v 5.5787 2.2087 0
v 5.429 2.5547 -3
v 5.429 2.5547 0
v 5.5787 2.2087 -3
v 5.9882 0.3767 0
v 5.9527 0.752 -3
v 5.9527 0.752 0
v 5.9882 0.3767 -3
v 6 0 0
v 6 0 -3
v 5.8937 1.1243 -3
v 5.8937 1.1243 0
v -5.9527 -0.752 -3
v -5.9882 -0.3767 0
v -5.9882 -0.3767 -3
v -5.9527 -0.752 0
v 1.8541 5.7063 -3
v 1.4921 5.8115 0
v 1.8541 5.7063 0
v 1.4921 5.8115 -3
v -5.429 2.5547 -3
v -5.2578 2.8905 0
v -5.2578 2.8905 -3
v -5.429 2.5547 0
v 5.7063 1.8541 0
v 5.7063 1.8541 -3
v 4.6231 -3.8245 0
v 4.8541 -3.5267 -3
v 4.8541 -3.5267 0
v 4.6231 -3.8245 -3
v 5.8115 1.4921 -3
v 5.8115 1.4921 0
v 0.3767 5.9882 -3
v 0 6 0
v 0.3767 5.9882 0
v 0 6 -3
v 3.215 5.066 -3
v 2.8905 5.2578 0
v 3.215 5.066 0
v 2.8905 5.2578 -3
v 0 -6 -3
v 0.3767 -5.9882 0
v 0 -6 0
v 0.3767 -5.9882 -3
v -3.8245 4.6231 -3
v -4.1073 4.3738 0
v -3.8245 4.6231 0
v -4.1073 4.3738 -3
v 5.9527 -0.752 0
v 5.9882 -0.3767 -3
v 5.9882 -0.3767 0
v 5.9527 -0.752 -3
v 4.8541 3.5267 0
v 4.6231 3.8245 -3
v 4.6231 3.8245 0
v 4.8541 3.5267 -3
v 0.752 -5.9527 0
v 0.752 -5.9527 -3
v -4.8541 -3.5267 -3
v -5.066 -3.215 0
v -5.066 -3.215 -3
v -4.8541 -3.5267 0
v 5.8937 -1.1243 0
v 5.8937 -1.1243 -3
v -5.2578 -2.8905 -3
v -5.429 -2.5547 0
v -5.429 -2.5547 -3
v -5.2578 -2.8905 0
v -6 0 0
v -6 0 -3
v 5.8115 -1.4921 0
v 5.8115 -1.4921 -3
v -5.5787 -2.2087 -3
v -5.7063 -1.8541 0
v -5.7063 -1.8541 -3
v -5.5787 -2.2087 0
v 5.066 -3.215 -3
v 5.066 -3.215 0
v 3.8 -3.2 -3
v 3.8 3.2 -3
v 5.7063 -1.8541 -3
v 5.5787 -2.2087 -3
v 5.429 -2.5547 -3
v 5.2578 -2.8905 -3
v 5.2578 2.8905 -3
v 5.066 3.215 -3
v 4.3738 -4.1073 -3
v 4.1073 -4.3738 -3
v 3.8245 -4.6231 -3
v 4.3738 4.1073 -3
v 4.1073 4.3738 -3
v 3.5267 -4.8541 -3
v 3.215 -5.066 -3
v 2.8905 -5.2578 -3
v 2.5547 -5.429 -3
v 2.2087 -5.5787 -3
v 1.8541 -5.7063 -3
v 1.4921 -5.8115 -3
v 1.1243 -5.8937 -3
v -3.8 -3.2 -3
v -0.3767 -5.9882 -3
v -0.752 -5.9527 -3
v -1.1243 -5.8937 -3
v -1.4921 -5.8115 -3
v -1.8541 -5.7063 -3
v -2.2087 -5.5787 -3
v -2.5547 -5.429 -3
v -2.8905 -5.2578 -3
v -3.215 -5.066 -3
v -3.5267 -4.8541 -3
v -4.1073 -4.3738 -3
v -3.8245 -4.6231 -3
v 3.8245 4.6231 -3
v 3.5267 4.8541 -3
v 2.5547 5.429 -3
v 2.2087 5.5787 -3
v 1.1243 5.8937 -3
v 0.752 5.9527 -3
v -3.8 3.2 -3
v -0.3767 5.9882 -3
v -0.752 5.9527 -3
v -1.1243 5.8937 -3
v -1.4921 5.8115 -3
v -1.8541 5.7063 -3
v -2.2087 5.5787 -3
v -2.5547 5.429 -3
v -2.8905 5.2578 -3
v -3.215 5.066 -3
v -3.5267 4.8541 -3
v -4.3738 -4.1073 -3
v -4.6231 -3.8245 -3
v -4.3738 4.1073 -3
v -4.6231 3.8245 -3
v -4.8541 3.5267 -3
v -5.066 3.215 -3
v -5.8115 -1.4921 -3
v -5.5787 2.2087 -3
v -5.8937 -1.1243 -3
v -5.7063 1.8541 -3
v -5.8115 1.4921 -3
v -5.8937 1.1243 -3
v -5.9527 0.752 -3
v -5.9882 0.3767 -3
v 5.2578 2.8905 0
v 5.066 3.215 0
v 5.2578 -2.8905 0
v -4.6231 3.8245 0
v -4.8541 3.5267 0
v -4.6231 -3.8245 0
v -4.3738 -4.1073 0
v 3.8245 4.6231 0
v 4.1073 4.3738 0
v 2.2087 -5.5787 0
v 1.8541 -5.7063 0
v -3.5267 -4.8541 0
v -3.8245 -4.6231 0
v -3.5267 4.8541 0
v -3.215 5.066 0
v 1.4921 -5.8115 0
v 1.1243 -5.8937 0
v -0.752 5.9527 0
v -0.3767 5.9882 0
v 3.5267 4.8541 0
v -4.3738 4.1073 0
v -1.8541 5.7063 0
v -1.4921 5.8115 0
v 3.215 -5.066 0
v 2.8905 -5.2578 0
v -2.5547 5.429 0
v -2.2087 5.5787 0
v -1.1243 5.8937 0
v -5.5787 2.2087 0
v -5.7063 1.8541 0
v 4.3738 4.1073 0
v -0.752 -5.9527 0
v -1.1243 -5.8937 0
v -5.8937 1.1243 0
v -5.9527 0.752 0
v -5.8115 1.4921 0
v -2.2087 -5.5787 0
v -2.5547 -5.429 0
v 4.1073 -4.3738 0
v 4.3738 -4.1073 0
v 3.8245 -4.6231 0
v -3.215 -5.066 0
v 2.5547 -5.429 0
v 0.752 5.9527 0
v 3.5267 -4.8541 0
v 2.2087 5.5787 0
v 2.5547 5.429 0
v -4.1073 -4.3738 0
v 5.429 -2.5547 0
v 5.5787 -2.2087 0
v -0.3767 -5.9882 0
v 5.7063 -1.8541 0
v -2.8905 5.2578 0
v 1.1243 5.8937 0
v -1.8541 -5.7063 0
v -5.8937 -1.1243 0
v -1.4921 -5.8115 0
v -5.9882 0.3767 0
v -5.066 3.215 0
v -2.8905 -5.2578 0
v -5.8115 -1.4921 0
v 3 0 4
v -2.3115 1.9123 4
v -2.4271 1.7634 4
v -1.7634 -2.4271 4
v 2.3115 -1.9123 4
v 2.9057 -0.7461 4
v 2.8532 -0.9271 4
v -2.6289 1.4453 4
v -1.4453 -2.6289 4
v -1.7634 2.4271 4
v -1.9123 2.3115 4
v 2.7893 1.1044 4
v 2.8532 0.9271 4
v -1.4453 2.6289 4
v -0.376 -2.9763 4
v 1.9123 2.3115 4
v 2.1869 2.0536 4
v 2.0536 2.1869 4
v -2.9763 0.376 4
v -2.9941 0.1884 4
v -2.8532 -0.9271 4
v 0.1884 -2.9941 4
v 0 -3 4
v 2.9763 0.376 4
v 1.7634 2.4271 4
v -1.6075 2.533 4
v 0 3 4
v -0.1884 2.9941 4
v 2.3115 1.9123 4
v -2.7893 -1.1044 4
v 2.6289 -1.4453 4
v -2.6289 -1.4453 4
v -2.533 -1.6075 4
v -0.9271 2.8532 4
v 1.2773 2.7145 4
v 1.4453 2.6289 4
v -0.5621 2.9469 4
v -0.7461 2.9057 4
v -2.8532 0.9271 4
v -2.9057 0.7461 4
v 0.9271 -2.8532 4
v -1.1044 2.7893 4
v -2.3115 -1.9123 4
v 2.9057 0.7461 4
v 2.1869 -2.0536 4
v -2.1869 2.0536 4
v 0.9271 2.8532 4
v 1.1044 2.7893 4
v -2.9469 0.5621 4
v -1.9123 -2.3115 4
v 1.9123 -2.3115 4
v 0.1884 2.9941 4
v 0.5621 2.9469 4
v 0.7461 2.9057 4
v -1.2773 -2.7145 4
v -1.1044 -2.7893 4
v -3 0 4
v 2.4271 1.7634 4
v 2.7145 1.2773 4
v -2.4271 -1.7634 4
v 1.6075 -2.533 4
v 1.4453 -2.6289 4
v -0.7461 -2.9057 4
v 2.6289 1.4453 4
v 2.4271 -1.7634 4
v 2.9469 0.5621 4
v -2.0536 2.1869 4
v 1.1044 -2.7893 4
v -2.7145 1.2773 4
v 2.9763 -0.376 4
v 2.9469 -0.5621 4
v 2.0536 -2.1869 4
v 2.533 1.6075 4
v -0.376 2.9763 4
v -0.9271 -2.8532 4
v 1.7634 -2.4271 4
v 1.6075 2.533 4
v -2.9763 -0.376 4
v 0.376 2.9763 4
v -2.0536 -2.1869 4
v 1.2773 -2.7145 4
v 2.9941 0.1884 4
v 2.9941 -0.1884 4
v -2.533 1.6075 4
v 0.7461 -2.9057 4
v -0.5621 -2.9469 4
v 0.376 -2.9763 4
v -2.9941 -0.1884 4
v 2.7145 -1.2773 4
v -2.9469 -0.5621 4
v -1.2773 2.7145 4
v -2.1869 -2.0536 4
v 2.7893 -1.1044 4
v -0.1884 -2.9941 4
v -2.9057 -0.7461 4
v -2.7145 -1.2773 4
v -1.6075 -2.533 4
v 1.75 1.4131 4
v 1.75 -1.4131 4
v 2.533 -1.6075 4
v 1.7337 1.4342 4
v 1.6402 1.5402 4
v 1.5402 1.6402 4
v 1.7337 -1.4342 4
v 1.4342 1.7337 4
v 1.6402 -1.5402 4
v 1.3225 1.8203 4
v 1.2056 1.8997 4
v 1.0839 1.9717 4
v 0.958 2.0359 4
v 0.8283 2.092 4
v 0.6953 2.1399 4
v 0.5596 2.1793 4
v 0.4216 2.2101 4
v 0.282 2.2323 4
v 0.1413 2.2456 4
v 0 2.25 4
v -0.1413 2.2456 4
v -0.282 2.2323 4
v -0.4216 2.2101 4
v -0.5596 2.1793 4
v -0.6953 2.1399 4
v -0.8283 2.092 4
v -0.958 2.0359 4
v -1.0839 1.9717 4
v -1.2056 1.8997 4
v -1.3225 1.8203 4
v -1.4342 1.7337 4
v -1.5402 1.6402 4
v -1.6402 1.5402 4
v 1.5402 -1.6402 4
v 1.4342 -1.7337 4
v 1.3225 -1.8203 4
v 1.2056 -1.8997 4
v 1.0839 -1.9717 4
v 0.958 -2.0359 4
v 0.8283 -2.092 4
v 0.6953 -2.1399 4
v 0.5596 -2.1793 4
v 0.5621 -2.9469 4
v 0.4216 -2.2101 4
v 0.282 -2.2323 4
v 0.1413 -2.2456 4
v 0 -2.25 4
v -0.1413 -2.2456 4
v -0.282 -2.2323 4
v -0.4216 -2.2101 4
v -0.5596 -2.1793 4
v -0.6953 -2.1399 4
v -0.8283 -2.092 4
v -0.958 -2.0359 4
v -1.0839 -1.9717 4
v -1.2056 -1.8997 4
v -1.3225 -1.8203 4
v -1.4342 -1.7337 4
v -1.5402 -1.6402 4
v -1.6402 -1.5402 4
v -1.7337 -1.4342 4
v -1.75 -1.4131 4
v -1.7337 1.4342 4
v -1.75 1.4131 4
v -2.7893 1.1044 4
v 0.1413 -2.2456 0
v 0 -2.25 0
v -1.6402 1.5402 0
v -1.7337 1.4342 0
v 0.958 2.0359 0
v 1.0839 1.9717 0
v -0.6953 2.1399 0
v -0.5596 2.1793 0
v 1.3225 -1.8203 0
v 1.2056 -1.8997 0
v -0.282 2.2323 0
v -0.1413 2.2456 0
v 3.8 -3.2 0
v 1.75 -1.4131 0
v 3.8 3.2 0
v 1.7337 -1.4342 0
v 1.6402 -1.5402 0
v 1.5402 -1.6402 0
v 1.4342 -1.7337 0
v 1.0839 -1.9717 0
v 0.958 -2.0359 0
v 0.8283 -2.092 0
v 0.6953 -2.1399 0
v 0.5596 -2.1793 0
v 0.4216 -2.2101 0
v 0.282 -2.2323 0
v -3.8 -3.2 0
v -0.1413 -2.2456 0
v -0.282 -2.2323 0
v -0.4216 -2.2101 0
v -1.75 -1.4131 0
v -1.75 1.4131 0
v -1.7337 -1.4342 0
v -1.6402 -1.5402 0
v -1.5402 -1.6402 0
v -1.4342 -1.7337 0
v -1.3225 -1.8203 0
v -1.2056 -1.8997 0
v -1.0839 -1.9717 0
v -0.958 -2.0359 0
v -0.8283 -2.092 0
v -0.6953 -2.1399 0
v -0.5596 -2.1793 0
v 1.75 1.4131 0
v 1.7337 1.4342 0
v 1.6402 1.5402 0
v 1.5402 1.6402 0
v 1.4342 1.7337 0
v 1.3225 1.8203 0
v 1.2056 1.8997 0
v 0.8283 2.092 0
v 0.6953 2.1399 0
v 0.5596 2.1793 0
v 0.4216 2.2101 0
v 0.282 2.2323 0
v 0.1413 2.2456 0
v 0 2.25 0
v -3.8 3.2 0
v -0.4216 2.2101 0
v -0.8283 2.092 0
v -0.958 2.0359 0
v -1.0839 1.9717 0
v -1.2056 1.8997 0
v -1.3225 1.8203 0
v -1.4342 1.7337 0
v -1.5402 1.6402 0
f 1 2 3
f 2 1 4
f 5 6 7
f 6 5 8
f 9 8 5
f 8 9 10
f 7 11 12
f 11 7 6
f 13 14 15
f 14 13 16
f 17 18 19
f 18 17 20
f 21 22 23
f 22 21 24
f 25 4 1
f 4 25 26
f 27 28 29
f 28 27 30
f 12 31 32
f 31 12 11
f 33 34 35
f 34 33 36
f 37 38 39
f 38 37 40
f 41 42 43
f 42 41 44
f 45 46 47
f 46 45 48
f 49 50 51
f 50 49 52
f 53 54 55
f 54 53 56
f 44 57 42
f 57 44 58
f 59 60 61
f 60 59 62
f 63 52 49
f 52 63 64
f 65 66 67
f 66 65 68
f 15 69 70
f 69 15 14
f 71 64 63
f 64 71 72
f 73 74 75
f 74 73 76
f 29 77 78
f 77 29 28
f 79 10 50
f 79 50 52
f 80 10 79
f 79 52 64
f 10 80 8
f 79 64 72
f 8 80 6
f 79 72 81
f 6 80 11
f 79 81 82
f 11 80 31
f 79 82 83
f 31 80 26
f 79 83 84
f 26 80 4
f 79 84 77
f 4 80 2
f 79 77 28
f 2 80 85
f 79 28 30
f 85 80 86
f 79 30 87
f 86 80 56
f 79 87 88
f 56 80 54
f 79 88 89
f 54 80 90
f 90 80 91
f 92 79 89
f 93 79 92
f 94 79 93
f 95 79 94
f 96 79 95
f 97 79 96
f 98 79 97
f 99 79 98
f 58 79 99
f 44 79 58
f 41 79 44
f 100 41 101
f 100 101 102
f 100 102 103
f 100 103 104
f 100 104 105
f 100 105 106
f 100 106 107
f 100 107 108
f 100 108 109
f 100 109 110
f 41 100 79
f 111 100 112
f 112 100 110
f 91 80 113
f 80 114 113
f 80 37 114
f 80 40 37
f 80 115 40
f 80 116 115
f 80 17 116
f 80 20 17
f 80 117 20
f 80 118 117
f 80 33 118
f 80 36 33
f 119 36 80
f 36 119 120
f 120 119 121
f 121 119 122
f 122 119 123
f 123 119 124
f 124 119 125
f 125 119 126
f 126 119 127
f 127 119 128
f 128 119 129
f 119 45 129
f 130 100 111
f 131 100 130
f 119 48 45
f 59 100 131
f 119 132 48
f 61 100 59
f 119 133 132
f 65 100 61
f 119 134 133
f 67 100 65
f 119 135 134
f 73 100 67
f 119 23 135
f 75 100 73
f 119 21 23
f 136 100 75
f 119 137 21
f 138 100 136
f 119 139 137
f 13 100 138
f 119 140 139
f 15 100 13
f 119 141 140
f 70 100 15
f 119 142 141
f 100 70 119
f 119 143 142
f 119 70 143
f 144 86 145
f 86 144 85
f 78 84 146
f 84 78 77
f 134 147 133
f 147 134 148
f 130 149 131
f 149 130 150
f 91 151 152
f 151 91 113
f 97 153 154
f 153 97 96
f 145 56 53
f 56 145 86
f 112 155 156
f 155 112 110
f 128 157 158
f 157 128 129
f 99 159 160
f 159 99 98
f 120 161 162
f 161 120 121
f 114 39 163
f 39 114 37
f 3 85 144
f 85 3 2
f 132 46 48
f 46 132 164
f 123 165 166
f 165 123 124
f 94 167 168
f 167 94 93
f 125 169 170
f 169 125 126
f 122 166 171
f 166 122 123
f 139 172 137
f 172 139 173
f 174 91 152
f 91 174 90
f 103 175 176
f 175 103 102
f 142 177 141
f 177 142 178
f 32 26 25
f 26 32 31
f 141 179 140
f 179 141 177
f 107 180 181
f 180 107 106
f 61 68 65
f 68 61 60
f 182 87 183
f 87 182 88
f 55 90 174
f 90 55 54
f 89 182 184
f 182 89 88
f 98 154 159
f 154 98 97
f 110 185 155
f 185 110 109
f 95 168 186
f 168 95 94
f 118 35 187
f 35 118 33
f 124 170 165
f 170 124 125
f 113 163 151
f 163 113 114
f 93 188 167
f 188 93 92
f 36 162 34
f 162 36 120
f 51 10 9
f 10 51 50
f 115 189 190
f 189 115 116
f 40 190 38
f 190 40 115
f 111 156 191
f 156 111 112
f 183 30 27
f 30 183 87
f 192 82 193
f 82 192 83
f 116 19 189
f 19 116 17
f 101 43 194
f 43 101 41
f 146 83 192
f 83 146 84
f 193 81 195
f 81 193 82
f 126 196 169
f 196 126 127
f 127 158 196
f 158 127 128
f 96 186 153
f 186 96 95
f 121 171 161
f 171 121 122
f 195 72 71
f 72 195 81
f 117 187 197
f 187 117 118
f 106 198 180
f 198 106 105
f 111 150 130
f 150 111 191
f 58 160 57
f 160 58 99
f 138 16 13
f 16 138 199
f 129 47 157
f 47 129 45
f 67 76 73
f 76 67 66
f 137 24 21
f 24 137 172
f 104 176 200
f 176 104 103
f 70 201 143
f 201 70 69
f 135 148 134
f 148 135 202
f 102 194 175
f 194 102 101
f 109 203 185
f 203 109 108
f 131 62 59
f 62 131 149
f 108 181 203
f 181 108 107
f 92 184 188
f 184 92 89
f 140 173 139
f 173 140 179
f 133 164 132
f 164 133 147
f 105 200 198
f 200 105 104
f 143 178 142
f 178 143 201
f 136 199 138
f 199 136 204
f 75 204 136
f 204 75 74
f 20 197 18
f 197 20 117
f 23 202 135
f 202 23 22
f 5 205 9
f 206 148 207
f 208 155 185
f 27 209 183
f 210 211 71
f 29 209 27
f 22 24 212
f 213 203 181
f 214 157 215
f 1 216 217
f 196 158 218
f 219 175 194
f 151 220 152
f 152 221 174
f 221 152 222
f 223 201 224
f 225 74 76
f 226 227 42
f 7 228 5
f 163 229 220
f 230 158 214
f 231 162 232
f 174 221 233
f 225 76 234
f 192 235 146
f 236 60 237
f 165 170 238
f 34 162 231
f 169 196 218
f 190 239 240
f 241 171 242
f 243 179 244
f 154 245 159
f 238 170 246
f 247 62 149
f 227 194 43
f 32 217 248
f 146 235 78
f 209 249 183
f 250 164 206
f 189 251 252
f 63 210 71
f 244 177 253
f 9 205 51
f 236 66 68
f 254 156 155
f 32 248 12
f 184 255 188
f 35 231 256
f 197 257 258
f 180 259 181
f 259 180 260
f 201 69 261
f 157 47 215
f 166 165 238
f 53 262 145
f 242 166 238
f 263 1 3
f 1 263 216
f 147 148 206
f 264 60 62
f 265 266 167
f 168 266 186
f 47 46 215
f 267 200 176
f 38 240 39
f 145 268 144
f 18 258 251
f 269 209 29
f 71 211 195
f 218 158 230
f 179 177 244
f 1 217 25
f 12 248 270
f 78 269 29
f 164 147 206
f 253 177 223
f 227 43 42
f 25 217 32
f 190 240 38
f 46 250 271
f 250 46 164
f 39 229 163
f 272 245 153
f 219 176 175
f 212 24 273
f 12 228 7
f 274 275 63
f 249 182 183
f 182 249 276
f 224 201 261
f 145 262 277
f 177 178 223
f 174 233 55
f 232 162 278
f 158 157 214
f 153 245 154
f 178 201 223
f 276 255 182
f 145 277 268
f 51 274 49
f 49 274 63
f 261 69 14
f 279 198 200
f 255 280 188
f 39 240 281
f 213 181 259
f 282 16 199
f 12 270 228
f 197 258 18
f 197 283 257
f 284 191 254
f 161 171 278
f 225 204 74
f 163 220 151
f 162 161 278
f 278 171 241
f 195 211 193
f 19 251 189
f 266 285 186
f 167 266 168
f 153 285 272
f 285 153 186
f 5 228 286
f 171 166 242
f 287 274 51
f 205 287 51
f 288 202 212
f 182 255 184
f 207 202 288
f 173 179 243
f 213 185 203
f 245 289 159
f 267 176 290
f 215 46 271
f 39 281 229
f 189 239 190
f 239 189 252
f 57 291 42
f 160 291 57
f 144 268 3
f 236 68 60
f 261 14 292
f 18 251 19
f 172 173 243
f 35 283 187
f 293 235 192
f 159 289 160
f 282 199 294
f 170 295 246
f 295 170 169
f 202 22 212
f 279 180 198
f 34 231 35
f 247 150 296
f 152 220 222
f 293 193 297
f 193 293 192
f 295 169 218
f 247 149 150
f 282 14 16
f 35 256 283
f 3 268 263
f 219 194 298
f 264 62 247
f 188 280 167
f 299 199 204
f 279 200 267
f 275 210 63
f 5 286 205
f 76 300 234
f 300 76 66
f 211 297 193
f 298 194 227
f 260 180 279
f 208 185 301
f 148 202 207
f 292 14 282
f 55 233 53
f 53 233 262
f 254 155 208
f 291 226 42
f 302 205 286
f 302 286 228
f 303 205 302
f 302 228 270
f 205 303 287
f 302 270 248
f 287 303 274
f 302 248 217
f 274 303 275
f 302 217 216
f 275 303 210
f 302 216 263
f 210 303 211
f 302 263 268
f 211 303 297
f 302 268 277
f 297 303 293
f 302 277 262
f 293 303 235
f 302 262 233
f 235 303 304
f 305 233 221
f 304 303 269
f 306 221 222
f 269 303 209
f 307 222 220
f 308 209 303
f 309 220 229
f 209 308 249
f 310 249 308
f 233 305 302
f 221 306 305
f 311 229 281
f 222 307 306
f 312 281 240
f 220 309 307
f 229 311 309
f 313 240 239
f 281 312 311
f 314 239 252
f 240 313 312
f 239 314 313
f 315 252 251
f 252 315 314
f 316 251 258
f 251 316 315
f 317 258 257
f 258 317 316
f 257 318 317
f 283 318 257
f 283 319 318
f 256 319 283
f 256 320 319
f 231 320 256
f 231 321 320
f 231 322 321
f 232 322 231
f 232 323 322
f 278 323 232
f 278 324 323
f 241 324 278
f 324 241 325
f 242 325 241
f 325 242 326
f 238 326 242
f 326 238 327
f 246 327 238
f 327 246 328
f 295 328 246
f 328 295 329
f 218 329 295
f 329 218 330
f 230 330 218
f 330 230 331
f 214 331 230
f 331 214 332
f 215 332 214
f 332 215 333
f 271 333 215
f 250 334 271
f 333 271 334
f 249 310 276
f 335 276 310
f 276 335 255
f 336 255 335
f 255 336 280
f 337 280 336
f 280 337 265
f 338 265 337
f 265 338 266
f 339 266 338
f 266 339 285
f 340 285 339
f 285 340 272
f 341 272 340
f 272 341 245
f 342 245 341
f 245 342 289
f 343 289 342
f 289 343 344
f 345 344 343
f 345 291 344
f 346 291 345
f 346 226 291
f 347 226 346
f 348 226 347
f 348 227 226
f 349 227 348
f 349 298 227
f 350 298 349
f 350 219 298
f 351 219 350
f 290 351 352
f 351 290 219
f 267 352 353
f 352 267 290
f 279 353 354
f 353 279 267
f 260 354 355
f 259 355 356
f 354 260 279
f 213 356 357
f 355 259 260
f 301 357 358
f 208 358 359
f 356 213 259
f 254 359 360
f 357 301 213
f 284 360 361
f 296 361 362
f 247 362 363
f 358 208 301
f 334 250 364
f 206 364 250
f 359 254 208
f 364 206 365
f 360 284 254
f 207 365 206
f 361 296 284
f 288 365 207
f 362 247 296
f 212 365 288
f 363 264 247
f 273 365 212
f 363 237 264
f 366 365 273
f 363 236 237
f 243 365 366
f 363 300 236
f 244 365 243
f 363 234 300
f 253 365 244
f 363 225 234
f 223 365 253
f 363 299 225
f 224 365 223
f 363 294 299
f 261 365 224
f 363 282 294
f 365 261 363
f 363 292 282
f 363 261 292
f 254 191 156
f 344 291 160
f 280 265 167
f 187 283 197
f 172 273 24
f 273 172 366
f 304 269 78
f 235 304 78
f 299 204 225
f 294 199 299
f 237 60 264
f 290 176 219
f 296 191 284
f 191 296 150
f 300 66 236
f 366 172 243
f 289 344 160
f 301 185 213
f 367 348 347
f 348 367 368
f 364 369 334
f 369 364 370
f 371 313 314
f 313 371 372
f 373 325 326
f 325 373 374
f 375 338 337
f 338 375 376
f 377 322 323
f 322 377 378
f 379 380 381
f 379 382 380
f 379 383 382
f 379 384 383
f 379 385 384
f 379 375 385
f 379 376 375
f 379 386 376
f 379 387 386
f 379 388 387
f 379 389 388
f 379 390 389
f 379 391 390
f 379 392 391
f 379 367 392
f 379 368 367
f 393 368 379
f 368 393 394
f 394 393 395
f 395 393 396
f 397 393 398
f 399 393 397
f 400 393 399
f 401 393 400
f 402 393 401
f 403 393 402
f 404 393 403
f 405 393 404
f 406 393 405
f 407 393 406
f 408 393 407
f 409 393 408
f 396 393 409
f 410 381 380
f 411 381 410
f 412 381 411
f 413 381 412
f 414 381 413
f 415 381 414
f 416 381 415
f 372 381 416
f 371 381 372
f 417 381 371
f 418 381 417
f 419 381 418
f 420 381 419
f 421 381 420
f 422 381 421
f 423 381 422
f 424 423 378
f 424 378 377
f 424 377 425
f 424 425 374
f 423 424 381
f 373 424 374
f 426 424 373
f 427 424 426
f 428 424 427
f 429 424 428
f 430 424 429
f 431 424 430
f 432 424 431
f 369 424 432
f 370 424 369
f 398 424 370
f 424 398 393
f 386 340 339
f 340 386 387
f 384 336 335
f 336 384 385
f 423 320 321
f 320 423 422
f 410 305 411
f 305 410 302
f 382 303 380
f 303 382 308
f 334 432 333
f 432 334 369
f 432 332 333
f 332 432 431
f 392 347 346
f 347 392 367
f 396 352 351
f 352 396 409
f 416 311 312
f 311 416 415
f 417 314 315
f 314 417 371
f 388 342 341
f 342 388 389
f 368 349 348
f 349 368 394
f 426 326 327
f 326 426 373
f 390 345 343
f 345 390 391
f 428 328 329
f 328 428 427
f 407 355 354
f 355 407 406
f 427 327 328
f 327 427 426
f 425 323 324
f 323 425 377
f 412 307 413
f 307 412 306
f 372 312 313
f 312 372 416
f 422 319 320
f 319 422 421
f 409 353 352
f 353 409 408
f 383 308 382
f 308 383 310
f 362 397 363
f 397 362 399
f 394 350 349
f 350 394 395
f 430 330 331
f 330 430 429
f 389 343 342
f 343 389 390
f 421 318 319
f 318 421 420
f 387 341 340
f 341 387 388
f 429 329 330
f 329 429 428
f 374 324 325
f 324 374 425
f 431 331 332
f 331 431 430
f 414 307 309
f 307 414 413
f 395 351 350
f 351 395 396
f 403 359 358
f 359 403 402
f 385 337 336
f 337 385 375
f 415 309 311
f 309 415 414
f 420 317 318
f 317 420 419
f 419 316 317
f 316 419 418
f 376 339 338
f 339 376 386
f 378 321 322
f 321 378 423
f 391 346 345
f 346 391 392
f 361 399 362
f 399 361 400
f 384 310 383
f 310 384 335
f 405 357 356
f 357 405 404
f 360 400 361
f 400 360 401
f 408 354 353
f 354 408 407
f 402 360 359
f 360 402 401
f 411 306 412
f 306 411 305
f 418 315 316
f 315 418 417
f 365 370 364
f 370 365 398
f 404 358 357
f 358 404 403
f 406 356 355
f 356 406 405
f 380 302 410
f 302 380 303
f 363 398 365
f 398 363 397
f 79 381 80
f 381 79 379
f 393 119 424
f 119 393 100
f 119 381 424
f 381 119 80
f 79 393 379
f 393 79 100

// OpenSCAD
// the joint between the motor and the joystick (e.g., COM-09032; https://www.sparkfun.com/products/9032)
// Note: print from small side upwards for best results
module motor_joint_joystick() {
	difference() {
		union() {
			translate([0, 0, -1.5]) {
			cylinder(h = 3, r = 6, center = true, $fn = 100);
			}
			translate([0, 0, 2]) {
			cylinder(h = 4, r1 = 6, r2 = 3, center = true, $fn = 100);
			}
		}
		
		// stepper motor joint hole
		translate([0, 0, -1.75]) {
			cube(size = [7.6, 6.4, 3.5], center = true);
		}
		
		// the navigation switch / encoder hole
		translate([0, 0, 2]) {
			difference() {
				cylinder(h = 4, r = 2.25, center = true, $fn = 100);
				translate([2.75, 0, 0]) { // 1.6 = 2.5 - (1.8 / 2)
					cube(size = [2, 5, 4], center = true);
				}
				translate([-2.75, 0, 0]) { // 1.6 = 2.5 - (1.8 / 2)
					cube(size = [2, 5, 4], center = true);
				}
			}
		}
	}
}

motor_joint_joystick();
